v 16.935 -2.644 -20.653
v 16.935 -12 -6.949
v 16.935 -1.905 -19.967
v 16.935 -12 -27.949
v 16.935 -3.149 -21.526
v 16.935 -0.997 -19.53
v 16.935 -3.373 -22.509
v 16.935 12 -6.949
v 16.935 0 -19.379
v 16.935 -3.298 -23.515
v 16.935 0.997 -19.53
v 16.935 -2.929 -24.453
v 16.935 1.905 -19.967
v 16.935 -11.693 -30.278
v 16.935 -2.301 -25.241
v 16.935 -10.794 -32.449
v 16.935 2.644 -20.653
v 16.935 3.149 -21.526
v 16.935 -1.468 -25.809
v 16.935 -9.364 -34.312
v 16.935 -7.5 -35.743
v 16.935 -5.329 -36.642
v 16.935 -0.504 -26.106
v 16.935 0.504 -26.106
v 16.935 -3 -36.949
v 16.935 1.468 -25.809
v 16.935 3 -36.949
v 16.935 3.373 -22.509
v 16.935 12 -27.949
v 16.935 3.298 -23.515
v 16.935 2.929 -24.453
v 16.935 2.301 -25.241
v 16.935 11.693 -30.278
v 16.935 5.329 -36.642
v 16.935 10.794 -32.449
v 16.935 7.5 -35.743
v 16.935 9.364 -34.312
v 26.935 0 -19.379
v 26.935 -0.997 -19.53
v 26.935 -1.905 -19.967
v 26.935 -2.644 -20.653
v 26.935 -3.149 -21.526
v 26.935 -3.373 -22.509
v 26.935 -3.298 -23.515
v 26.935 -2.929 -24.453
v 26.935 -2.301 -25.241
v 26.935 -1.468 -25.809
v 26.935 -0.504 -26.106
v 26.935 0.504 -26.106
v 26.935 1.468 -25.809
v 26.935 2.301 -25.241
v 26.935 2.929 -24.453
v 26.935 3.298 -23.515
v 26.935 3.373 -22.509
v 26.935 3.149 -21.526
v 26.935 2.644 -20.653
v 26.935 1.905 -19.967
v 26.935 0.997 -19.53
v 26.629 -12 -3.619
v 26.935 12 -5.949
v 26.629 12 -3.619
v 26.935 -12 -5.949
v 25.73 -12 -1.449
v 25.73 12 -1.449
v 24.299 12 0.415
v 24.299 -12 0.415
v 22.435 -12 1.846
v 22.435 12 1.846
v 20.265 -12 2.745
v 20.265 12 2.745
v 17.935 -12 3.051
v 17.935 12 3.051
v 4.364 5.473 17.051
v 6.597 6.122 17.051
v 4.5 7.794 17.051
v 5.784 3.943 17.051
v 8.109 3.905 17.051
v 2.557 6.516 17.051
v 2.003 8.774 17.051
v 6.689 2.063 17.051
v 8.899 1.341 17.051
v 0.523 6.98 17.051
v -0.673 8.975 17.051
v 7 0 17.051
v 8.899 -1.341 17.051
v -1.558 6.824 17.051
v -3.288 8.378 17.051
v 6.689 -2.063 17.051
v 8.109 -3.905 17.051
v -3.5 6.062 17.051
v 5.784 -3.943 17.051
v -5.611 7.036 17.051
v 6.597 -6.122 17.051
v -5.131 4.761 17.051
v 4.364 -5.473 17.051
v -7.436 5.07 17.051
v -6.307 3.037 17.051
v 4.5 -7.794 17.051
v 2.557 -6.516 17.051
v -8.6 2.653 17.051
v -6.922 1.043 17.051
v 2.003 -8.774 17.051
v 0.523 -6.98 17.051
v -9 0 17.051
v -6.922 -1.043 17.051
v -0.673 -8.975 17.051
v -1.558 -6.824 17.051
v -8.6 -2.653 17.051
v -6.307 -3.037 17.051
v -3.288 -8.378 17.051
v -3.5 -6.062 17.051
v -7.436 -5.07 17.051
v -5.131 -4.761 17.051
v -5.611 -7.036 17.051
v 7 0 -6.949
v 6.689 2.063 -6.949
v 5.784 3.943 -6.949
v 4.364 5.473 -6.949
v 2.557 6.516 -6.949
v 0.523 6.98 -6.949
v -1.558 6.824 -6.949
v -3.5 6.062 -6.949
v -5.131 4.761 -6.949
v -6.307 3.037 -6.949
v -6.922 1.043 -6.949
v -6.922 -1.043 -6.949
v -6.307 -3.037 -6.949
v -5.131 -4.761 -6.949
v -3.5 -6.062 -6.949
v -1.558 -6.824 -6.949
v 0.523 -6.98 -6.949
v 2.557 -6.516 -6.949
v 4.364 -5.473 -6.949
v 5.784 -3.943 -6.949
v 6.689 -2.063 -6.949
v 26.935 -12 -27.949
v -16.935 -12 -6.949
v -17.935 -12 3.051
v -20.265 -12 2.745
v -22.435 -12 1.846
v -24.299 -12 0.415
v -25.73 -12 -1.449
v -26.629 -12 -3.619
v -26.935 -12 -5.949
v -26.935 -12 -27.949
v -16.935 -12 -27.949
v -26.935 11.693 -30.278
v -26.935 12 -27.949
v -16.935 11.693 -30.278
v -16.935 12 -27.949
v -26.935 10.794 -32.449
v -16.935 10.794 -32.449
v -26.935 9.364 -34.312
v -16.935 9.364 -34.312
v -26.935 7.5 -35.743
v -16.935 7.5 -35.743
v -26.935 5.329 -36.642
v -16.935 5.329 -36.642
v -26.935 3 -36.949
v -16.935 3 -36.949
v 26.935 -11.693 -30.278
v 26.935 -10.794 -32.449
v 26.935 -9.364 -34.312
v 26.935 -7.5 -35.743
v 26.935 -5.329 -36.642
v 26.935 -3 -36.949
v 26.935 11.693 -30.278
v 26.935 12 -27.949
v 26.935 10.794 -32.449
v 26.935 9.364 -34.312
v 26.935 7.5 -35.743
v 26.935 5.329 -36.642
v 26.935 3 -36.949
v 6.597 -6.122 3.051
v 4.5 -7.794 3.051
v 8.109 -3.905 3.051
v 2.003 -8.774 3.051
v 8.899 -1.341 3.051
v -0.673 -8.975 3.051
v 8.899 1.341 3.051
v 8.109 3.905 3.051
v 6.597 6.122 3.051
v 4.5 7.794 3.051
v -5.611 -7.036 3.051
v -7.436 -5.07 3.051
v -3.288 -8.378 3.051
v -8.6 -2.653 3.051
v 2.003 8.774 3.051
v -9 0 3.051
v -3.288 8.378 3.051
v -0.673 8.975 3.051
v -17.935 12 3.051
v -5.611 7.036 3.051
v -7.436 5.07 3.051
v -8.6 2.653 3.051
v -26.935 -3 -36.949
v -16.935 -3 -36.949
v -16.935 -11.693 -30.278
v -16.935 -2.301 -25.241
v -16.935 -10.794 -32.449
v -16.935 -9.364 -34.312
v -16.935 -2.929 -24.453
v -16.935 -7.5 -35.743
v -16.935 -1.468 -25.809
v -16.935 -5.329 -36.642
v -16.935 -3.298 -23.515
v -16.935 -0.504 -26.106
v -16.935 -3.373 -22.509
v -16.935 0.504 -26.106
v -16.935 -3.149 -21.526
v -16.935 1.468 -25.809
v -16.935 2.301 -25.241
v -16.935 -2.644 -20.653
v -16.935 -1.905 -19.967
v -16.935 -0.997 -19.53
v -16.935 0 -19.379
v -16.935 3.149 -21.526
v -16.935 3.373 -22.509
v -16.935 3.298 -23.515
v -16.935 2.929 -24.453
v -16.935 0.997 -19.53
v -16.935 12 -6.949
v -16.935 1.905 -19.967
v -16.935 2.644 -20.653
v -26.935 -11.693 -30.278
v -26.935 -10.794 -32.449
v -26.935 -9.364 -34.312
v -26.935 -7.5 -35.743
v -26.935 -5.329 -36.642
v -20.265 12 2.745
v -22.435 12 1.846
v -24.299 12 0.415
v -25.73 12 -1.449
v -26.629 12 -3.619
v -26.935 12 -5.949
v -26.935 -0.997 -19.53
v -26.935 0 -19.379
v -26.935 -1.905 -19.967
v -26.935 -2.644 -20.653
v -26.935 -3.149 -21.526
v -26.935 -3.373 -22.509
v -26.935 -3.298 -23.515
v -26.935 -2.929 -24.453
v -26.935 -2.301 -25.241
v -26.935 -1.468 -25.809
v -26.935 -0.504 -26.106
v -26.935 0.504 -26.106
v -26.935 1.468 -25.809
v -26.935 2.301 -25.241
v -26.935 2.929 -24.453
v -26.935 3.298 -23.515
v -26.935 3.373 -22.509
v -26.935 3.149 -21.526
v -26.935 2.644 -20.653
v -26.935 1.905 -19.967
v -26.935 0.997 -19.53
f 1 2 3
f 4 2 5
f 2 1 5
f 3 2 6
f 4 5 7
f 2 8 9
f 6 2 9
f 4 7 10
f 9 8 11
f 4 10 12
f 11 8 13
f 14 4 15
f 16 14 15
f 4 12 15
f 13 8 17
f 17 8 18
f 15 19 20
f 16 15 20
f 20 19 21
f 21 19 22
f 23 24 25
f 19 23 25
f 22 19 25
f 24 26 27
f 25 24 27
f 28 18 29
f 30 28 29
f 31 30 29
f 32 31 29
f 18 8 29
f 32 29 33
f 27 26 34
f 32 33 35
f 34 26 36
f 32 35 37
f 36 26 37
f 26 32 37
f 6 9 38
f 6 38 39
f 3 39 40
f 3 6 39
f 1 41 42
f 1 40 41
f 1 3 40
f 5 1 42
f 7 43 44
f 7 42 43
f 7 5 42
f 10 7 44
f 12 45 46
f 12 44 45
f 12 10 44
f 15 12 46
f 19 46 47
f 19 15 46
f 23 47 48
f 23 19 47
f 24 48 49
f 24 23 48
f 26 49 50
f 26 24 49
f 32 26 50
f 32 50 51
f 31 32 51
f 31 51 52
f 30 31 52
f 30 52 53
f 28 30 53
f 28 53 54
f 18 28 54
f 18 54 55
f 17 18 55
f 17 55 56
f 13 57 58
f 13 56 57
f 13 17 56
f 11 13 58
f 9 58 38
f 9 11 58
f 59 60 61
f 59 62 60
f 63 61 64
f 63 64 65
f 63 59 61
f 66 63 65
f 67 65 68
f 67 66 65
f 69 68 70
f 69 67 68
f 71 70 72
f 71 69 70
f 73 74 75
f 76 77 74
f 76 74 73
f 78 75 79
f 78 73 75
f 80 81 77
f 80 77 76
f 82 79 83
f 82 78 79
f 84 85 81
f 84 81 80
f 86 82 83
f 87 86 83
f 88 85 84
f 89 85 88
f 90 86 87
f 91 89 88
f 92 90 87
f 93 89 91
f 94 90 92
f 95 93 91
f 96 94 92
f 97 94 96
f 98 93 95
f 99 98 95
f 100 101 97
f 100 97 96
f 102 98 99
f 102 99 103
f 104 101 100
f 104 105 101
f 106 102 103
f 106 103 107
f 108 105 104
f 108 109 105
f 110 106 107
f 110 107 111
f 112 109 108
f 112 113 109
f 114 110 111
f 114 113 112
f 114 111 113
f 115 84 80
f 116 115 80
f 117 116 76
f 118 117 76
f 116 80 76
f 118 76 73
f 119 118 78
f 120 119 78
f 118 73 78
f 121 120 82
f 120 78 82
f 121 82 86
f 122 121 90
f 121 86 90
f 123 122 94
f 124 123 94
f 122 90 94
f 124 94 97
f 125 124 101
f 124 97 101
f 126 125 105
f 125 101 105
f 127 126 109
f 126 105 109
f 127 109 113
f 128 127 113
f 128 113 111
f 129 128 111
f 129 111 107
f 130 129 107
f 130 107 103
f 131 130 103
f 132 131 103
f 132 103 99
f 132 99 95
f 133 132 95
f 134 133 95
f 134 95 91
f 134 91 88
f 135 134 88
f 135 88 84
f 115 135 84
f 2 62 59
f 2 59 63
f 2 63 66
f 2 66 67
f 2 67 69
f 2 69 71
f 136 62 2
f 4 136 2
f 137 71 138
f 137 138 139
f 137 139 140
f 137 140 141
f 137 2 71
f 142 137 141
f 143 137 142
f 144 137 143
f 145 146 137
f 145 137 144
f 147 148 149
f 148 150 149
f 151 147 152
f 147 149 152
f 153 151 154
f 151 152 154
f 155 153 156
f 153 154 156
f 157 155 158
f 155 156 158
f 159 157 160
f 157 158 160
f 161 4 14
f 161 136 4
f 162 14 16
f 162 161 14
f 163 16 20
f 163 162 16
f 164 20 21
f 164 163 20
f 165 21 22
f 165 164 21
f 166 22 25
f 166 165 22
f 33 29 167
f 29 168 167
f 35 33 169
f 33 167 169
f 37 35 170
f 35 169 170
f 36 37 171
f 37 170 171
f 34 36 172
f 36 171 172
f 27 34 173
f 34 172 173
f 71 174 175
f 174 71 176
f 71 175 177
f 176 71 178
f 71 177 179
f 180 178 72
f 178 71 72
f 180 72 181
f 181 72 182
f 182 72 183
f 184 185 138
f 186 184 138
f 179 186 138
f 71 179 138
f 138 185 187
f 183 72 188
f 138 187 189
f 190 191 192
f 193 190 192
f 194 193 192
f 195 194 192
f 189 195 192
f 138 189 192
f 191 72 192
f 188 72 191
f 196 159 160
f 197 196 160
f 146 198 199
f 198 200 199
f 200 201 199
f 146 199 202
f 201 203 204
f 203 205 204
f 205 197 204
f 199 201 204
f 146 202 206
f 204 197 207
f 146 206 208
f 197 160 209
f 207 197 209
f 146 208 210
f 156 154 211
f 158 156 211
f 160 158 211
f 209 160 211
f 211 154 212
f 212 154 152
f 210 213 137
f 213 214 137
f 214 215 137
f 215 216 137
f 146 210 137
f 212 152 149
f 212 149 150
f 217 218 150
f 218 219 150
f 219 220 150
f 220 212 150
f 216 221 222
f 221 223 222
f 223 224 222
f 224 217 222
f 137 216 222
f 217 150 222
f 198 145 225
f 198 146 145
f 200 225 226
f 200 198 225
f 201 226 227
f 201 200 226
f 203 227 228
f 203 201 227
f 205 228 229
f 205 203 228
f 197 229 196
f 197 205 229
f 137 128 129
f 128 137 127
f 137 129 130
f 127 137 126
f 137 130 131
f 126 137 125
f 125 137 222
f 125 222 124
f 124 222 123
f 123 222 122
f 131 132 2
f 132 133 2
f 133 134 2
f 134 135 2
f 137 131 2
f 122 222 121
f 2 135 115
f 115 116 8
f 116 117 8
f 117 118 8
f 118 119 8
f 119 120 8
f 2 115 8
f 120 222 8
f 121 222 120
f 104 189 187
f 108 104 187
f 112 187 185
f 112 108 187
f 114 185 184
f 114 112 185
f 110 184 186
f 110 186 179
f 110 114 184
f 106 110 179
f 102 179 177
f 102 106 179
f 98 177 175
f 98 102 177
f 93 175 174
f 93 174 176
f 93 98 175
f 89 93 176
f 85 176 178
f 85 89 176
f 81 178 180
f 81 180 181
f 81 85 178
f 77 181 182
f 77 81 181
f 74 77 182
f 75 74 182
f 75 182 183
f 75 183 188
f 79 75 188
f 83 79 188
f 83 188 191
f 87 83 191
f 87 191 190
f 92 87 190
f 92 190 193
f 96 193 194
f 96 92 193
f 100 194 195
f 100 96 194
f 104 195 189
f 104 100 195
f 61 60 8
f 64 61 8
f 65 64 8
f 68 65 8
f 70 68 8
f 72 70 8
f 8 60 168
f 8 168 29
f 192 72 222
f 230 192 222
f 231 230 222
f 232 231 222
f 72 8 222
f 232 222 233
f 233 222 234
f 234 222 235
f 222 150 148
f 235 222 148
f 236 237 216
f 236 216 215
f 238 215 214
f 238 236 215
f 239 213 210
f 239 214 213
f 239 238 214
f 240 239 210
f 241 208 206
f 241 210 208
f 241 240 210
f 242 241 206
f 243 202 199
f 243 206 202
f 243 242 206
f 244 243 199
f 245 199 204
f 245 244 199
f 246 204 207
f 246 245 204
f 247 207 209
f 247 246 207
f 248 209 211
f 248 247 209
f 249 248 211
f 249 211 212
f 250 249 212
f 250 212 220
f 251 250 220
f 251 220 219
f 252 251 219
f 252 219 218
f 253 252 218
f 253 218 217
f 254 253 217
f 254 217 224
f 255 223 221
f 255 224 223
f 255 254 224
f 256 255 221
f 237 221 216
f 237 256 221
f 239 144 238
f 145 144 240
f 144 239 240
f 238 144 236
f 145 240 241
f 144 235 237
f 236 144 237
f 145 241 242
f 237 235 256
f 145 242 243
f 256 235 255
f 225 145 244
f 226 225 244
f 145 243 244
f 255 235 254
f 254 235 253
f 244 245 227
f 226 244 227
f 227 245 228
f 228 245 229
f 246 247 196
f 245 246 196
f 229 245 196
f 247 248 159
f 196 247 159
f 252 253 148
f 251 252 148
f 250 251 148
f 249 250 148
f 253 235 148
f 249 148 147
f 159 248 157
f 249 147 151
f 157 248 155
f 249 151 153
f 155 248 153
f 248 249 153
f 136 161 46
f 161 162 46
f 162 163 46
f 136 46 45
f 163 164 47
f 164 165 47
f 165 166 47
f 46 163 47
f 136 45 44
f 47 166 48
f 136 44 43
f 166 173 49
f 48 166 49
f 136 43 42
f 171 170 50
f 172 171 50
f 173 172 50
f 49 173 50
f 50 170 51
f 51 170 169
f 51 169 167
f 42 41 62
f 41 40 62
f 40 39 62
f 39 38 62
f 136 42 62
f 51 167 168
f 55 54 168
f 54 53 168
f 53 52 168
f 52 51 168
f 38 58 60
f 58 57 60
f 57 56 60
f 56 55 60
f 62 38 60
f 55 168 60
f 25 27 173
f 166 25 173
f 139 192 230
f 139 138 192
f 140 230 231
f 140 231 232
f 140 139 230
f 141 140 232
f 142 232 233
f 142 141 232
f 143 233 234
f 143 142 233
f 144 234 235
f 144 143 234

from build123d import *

# Parameters (mm, degrees)
BOSS_EXTRUDE1_DEPTH     = 12
SKETCH2_R               = 7
CUT_EXTRUDE1_DEPTH      = 17
BOSS_EXTRUDE2_START     = 14
SKETCH2_3_R             = 9
SKETCH2_3_R_2           = 7
BOSS_EXTRUDE2_DEPTH     = 14
CUT_EXTRUDE2_DEPTH      = 16
CUT_EXTRUDE2_DEPTH_BACK = 69
SKETCH5_R               = 3.382435313
FILLET2_R               = 9
FILLET3_R               = 9


with BuildPart() as part:
    # Sketch1 → Boss-Extrude1 (new, symmetric)
    with BuildSketch(Plane(origin=(0, 0, 0), x_dir=(1, 0, 0), z_dir=(0, 1, 0))):
        Polygon((-16.935483871, 6.948519541), (16.935483871, 6.948519541), (16.935483871, 36.948519541), (26.935483871, 36.948519541), (26.935483871, -3.051480459), (-26.935483871, -3.051480459), (-26.935483871, 36.948519541), (-16.935483871, 36.948519541), align=None)
    extrude(amount=BOSS_EXTRUDE1_DEPTH, both=True)

    # Sketch2 → Cut-Extrude1 (cut, symmetric)
    with BuildSketch(Plane.XY.offset(3.051480459)):
        Circle(SKETCH2_R)
    extrude(amount=CUT_EXTRUDE1_DEPTH, both=True, mode=Mode.SUBTRACT)

    # Sketch2<3> → Boss-Extrude2 (add)
    with BuildSketch(Plane.XY.offset(3.051480459).offset(BOSS_EXTRUDE2_START)):
        Circle(SKETCH2_3_R)
        Circle(SKETCH2_3_R_2, mode=Mode.SUBTRACT)
    extrude(amount=-BOSS_EXTRUDE2_DEPTH)

    # Sketch5 → Cut-Extrude2 (cut, two sides: drawn at the far end of the back side and taken through both)
    with BuildSketch(Plane(origin=(26.935483871, 0, 0), x_dir=(0, 0, -1), z_dir=(1, 0, 0)).offset(-CUT_EXTRUDE2_DEPTH_BACK)):
        with Locations((22.7618385, 0)):
            Circle(SKETCH5_R)
    extrude(amount=CUT_EXTRUDE2_DEPTH + CUT_EXTRUDE2_DEPTH_BACK, mode=Mode.SUBTRACT)

    # Fillet2
    fillet2_edges = [part.edges().sort_by_distance(p)[0] for p in [
        (-21.935483871, 12, -36.948519541),
        (-21.935483871, -12, -36.948519541),
        (21.935483871, -12, -36.948519541),
        (21.935483871, 12, -36.948519541),
    ]]
    fillet(fillet2_edges, radius=FILLET2_R)

    # Fillet3
    fillet3_edges = [part.edges().sort_by_distance(p)[0] for p in [
        (-26.935483871, 0, 3.051480459),
        (26.935483871, 0, 3.051480459),
    ]]
    fillet(fillet3_edges, radius=FILLET3_R)


solid = part.part
